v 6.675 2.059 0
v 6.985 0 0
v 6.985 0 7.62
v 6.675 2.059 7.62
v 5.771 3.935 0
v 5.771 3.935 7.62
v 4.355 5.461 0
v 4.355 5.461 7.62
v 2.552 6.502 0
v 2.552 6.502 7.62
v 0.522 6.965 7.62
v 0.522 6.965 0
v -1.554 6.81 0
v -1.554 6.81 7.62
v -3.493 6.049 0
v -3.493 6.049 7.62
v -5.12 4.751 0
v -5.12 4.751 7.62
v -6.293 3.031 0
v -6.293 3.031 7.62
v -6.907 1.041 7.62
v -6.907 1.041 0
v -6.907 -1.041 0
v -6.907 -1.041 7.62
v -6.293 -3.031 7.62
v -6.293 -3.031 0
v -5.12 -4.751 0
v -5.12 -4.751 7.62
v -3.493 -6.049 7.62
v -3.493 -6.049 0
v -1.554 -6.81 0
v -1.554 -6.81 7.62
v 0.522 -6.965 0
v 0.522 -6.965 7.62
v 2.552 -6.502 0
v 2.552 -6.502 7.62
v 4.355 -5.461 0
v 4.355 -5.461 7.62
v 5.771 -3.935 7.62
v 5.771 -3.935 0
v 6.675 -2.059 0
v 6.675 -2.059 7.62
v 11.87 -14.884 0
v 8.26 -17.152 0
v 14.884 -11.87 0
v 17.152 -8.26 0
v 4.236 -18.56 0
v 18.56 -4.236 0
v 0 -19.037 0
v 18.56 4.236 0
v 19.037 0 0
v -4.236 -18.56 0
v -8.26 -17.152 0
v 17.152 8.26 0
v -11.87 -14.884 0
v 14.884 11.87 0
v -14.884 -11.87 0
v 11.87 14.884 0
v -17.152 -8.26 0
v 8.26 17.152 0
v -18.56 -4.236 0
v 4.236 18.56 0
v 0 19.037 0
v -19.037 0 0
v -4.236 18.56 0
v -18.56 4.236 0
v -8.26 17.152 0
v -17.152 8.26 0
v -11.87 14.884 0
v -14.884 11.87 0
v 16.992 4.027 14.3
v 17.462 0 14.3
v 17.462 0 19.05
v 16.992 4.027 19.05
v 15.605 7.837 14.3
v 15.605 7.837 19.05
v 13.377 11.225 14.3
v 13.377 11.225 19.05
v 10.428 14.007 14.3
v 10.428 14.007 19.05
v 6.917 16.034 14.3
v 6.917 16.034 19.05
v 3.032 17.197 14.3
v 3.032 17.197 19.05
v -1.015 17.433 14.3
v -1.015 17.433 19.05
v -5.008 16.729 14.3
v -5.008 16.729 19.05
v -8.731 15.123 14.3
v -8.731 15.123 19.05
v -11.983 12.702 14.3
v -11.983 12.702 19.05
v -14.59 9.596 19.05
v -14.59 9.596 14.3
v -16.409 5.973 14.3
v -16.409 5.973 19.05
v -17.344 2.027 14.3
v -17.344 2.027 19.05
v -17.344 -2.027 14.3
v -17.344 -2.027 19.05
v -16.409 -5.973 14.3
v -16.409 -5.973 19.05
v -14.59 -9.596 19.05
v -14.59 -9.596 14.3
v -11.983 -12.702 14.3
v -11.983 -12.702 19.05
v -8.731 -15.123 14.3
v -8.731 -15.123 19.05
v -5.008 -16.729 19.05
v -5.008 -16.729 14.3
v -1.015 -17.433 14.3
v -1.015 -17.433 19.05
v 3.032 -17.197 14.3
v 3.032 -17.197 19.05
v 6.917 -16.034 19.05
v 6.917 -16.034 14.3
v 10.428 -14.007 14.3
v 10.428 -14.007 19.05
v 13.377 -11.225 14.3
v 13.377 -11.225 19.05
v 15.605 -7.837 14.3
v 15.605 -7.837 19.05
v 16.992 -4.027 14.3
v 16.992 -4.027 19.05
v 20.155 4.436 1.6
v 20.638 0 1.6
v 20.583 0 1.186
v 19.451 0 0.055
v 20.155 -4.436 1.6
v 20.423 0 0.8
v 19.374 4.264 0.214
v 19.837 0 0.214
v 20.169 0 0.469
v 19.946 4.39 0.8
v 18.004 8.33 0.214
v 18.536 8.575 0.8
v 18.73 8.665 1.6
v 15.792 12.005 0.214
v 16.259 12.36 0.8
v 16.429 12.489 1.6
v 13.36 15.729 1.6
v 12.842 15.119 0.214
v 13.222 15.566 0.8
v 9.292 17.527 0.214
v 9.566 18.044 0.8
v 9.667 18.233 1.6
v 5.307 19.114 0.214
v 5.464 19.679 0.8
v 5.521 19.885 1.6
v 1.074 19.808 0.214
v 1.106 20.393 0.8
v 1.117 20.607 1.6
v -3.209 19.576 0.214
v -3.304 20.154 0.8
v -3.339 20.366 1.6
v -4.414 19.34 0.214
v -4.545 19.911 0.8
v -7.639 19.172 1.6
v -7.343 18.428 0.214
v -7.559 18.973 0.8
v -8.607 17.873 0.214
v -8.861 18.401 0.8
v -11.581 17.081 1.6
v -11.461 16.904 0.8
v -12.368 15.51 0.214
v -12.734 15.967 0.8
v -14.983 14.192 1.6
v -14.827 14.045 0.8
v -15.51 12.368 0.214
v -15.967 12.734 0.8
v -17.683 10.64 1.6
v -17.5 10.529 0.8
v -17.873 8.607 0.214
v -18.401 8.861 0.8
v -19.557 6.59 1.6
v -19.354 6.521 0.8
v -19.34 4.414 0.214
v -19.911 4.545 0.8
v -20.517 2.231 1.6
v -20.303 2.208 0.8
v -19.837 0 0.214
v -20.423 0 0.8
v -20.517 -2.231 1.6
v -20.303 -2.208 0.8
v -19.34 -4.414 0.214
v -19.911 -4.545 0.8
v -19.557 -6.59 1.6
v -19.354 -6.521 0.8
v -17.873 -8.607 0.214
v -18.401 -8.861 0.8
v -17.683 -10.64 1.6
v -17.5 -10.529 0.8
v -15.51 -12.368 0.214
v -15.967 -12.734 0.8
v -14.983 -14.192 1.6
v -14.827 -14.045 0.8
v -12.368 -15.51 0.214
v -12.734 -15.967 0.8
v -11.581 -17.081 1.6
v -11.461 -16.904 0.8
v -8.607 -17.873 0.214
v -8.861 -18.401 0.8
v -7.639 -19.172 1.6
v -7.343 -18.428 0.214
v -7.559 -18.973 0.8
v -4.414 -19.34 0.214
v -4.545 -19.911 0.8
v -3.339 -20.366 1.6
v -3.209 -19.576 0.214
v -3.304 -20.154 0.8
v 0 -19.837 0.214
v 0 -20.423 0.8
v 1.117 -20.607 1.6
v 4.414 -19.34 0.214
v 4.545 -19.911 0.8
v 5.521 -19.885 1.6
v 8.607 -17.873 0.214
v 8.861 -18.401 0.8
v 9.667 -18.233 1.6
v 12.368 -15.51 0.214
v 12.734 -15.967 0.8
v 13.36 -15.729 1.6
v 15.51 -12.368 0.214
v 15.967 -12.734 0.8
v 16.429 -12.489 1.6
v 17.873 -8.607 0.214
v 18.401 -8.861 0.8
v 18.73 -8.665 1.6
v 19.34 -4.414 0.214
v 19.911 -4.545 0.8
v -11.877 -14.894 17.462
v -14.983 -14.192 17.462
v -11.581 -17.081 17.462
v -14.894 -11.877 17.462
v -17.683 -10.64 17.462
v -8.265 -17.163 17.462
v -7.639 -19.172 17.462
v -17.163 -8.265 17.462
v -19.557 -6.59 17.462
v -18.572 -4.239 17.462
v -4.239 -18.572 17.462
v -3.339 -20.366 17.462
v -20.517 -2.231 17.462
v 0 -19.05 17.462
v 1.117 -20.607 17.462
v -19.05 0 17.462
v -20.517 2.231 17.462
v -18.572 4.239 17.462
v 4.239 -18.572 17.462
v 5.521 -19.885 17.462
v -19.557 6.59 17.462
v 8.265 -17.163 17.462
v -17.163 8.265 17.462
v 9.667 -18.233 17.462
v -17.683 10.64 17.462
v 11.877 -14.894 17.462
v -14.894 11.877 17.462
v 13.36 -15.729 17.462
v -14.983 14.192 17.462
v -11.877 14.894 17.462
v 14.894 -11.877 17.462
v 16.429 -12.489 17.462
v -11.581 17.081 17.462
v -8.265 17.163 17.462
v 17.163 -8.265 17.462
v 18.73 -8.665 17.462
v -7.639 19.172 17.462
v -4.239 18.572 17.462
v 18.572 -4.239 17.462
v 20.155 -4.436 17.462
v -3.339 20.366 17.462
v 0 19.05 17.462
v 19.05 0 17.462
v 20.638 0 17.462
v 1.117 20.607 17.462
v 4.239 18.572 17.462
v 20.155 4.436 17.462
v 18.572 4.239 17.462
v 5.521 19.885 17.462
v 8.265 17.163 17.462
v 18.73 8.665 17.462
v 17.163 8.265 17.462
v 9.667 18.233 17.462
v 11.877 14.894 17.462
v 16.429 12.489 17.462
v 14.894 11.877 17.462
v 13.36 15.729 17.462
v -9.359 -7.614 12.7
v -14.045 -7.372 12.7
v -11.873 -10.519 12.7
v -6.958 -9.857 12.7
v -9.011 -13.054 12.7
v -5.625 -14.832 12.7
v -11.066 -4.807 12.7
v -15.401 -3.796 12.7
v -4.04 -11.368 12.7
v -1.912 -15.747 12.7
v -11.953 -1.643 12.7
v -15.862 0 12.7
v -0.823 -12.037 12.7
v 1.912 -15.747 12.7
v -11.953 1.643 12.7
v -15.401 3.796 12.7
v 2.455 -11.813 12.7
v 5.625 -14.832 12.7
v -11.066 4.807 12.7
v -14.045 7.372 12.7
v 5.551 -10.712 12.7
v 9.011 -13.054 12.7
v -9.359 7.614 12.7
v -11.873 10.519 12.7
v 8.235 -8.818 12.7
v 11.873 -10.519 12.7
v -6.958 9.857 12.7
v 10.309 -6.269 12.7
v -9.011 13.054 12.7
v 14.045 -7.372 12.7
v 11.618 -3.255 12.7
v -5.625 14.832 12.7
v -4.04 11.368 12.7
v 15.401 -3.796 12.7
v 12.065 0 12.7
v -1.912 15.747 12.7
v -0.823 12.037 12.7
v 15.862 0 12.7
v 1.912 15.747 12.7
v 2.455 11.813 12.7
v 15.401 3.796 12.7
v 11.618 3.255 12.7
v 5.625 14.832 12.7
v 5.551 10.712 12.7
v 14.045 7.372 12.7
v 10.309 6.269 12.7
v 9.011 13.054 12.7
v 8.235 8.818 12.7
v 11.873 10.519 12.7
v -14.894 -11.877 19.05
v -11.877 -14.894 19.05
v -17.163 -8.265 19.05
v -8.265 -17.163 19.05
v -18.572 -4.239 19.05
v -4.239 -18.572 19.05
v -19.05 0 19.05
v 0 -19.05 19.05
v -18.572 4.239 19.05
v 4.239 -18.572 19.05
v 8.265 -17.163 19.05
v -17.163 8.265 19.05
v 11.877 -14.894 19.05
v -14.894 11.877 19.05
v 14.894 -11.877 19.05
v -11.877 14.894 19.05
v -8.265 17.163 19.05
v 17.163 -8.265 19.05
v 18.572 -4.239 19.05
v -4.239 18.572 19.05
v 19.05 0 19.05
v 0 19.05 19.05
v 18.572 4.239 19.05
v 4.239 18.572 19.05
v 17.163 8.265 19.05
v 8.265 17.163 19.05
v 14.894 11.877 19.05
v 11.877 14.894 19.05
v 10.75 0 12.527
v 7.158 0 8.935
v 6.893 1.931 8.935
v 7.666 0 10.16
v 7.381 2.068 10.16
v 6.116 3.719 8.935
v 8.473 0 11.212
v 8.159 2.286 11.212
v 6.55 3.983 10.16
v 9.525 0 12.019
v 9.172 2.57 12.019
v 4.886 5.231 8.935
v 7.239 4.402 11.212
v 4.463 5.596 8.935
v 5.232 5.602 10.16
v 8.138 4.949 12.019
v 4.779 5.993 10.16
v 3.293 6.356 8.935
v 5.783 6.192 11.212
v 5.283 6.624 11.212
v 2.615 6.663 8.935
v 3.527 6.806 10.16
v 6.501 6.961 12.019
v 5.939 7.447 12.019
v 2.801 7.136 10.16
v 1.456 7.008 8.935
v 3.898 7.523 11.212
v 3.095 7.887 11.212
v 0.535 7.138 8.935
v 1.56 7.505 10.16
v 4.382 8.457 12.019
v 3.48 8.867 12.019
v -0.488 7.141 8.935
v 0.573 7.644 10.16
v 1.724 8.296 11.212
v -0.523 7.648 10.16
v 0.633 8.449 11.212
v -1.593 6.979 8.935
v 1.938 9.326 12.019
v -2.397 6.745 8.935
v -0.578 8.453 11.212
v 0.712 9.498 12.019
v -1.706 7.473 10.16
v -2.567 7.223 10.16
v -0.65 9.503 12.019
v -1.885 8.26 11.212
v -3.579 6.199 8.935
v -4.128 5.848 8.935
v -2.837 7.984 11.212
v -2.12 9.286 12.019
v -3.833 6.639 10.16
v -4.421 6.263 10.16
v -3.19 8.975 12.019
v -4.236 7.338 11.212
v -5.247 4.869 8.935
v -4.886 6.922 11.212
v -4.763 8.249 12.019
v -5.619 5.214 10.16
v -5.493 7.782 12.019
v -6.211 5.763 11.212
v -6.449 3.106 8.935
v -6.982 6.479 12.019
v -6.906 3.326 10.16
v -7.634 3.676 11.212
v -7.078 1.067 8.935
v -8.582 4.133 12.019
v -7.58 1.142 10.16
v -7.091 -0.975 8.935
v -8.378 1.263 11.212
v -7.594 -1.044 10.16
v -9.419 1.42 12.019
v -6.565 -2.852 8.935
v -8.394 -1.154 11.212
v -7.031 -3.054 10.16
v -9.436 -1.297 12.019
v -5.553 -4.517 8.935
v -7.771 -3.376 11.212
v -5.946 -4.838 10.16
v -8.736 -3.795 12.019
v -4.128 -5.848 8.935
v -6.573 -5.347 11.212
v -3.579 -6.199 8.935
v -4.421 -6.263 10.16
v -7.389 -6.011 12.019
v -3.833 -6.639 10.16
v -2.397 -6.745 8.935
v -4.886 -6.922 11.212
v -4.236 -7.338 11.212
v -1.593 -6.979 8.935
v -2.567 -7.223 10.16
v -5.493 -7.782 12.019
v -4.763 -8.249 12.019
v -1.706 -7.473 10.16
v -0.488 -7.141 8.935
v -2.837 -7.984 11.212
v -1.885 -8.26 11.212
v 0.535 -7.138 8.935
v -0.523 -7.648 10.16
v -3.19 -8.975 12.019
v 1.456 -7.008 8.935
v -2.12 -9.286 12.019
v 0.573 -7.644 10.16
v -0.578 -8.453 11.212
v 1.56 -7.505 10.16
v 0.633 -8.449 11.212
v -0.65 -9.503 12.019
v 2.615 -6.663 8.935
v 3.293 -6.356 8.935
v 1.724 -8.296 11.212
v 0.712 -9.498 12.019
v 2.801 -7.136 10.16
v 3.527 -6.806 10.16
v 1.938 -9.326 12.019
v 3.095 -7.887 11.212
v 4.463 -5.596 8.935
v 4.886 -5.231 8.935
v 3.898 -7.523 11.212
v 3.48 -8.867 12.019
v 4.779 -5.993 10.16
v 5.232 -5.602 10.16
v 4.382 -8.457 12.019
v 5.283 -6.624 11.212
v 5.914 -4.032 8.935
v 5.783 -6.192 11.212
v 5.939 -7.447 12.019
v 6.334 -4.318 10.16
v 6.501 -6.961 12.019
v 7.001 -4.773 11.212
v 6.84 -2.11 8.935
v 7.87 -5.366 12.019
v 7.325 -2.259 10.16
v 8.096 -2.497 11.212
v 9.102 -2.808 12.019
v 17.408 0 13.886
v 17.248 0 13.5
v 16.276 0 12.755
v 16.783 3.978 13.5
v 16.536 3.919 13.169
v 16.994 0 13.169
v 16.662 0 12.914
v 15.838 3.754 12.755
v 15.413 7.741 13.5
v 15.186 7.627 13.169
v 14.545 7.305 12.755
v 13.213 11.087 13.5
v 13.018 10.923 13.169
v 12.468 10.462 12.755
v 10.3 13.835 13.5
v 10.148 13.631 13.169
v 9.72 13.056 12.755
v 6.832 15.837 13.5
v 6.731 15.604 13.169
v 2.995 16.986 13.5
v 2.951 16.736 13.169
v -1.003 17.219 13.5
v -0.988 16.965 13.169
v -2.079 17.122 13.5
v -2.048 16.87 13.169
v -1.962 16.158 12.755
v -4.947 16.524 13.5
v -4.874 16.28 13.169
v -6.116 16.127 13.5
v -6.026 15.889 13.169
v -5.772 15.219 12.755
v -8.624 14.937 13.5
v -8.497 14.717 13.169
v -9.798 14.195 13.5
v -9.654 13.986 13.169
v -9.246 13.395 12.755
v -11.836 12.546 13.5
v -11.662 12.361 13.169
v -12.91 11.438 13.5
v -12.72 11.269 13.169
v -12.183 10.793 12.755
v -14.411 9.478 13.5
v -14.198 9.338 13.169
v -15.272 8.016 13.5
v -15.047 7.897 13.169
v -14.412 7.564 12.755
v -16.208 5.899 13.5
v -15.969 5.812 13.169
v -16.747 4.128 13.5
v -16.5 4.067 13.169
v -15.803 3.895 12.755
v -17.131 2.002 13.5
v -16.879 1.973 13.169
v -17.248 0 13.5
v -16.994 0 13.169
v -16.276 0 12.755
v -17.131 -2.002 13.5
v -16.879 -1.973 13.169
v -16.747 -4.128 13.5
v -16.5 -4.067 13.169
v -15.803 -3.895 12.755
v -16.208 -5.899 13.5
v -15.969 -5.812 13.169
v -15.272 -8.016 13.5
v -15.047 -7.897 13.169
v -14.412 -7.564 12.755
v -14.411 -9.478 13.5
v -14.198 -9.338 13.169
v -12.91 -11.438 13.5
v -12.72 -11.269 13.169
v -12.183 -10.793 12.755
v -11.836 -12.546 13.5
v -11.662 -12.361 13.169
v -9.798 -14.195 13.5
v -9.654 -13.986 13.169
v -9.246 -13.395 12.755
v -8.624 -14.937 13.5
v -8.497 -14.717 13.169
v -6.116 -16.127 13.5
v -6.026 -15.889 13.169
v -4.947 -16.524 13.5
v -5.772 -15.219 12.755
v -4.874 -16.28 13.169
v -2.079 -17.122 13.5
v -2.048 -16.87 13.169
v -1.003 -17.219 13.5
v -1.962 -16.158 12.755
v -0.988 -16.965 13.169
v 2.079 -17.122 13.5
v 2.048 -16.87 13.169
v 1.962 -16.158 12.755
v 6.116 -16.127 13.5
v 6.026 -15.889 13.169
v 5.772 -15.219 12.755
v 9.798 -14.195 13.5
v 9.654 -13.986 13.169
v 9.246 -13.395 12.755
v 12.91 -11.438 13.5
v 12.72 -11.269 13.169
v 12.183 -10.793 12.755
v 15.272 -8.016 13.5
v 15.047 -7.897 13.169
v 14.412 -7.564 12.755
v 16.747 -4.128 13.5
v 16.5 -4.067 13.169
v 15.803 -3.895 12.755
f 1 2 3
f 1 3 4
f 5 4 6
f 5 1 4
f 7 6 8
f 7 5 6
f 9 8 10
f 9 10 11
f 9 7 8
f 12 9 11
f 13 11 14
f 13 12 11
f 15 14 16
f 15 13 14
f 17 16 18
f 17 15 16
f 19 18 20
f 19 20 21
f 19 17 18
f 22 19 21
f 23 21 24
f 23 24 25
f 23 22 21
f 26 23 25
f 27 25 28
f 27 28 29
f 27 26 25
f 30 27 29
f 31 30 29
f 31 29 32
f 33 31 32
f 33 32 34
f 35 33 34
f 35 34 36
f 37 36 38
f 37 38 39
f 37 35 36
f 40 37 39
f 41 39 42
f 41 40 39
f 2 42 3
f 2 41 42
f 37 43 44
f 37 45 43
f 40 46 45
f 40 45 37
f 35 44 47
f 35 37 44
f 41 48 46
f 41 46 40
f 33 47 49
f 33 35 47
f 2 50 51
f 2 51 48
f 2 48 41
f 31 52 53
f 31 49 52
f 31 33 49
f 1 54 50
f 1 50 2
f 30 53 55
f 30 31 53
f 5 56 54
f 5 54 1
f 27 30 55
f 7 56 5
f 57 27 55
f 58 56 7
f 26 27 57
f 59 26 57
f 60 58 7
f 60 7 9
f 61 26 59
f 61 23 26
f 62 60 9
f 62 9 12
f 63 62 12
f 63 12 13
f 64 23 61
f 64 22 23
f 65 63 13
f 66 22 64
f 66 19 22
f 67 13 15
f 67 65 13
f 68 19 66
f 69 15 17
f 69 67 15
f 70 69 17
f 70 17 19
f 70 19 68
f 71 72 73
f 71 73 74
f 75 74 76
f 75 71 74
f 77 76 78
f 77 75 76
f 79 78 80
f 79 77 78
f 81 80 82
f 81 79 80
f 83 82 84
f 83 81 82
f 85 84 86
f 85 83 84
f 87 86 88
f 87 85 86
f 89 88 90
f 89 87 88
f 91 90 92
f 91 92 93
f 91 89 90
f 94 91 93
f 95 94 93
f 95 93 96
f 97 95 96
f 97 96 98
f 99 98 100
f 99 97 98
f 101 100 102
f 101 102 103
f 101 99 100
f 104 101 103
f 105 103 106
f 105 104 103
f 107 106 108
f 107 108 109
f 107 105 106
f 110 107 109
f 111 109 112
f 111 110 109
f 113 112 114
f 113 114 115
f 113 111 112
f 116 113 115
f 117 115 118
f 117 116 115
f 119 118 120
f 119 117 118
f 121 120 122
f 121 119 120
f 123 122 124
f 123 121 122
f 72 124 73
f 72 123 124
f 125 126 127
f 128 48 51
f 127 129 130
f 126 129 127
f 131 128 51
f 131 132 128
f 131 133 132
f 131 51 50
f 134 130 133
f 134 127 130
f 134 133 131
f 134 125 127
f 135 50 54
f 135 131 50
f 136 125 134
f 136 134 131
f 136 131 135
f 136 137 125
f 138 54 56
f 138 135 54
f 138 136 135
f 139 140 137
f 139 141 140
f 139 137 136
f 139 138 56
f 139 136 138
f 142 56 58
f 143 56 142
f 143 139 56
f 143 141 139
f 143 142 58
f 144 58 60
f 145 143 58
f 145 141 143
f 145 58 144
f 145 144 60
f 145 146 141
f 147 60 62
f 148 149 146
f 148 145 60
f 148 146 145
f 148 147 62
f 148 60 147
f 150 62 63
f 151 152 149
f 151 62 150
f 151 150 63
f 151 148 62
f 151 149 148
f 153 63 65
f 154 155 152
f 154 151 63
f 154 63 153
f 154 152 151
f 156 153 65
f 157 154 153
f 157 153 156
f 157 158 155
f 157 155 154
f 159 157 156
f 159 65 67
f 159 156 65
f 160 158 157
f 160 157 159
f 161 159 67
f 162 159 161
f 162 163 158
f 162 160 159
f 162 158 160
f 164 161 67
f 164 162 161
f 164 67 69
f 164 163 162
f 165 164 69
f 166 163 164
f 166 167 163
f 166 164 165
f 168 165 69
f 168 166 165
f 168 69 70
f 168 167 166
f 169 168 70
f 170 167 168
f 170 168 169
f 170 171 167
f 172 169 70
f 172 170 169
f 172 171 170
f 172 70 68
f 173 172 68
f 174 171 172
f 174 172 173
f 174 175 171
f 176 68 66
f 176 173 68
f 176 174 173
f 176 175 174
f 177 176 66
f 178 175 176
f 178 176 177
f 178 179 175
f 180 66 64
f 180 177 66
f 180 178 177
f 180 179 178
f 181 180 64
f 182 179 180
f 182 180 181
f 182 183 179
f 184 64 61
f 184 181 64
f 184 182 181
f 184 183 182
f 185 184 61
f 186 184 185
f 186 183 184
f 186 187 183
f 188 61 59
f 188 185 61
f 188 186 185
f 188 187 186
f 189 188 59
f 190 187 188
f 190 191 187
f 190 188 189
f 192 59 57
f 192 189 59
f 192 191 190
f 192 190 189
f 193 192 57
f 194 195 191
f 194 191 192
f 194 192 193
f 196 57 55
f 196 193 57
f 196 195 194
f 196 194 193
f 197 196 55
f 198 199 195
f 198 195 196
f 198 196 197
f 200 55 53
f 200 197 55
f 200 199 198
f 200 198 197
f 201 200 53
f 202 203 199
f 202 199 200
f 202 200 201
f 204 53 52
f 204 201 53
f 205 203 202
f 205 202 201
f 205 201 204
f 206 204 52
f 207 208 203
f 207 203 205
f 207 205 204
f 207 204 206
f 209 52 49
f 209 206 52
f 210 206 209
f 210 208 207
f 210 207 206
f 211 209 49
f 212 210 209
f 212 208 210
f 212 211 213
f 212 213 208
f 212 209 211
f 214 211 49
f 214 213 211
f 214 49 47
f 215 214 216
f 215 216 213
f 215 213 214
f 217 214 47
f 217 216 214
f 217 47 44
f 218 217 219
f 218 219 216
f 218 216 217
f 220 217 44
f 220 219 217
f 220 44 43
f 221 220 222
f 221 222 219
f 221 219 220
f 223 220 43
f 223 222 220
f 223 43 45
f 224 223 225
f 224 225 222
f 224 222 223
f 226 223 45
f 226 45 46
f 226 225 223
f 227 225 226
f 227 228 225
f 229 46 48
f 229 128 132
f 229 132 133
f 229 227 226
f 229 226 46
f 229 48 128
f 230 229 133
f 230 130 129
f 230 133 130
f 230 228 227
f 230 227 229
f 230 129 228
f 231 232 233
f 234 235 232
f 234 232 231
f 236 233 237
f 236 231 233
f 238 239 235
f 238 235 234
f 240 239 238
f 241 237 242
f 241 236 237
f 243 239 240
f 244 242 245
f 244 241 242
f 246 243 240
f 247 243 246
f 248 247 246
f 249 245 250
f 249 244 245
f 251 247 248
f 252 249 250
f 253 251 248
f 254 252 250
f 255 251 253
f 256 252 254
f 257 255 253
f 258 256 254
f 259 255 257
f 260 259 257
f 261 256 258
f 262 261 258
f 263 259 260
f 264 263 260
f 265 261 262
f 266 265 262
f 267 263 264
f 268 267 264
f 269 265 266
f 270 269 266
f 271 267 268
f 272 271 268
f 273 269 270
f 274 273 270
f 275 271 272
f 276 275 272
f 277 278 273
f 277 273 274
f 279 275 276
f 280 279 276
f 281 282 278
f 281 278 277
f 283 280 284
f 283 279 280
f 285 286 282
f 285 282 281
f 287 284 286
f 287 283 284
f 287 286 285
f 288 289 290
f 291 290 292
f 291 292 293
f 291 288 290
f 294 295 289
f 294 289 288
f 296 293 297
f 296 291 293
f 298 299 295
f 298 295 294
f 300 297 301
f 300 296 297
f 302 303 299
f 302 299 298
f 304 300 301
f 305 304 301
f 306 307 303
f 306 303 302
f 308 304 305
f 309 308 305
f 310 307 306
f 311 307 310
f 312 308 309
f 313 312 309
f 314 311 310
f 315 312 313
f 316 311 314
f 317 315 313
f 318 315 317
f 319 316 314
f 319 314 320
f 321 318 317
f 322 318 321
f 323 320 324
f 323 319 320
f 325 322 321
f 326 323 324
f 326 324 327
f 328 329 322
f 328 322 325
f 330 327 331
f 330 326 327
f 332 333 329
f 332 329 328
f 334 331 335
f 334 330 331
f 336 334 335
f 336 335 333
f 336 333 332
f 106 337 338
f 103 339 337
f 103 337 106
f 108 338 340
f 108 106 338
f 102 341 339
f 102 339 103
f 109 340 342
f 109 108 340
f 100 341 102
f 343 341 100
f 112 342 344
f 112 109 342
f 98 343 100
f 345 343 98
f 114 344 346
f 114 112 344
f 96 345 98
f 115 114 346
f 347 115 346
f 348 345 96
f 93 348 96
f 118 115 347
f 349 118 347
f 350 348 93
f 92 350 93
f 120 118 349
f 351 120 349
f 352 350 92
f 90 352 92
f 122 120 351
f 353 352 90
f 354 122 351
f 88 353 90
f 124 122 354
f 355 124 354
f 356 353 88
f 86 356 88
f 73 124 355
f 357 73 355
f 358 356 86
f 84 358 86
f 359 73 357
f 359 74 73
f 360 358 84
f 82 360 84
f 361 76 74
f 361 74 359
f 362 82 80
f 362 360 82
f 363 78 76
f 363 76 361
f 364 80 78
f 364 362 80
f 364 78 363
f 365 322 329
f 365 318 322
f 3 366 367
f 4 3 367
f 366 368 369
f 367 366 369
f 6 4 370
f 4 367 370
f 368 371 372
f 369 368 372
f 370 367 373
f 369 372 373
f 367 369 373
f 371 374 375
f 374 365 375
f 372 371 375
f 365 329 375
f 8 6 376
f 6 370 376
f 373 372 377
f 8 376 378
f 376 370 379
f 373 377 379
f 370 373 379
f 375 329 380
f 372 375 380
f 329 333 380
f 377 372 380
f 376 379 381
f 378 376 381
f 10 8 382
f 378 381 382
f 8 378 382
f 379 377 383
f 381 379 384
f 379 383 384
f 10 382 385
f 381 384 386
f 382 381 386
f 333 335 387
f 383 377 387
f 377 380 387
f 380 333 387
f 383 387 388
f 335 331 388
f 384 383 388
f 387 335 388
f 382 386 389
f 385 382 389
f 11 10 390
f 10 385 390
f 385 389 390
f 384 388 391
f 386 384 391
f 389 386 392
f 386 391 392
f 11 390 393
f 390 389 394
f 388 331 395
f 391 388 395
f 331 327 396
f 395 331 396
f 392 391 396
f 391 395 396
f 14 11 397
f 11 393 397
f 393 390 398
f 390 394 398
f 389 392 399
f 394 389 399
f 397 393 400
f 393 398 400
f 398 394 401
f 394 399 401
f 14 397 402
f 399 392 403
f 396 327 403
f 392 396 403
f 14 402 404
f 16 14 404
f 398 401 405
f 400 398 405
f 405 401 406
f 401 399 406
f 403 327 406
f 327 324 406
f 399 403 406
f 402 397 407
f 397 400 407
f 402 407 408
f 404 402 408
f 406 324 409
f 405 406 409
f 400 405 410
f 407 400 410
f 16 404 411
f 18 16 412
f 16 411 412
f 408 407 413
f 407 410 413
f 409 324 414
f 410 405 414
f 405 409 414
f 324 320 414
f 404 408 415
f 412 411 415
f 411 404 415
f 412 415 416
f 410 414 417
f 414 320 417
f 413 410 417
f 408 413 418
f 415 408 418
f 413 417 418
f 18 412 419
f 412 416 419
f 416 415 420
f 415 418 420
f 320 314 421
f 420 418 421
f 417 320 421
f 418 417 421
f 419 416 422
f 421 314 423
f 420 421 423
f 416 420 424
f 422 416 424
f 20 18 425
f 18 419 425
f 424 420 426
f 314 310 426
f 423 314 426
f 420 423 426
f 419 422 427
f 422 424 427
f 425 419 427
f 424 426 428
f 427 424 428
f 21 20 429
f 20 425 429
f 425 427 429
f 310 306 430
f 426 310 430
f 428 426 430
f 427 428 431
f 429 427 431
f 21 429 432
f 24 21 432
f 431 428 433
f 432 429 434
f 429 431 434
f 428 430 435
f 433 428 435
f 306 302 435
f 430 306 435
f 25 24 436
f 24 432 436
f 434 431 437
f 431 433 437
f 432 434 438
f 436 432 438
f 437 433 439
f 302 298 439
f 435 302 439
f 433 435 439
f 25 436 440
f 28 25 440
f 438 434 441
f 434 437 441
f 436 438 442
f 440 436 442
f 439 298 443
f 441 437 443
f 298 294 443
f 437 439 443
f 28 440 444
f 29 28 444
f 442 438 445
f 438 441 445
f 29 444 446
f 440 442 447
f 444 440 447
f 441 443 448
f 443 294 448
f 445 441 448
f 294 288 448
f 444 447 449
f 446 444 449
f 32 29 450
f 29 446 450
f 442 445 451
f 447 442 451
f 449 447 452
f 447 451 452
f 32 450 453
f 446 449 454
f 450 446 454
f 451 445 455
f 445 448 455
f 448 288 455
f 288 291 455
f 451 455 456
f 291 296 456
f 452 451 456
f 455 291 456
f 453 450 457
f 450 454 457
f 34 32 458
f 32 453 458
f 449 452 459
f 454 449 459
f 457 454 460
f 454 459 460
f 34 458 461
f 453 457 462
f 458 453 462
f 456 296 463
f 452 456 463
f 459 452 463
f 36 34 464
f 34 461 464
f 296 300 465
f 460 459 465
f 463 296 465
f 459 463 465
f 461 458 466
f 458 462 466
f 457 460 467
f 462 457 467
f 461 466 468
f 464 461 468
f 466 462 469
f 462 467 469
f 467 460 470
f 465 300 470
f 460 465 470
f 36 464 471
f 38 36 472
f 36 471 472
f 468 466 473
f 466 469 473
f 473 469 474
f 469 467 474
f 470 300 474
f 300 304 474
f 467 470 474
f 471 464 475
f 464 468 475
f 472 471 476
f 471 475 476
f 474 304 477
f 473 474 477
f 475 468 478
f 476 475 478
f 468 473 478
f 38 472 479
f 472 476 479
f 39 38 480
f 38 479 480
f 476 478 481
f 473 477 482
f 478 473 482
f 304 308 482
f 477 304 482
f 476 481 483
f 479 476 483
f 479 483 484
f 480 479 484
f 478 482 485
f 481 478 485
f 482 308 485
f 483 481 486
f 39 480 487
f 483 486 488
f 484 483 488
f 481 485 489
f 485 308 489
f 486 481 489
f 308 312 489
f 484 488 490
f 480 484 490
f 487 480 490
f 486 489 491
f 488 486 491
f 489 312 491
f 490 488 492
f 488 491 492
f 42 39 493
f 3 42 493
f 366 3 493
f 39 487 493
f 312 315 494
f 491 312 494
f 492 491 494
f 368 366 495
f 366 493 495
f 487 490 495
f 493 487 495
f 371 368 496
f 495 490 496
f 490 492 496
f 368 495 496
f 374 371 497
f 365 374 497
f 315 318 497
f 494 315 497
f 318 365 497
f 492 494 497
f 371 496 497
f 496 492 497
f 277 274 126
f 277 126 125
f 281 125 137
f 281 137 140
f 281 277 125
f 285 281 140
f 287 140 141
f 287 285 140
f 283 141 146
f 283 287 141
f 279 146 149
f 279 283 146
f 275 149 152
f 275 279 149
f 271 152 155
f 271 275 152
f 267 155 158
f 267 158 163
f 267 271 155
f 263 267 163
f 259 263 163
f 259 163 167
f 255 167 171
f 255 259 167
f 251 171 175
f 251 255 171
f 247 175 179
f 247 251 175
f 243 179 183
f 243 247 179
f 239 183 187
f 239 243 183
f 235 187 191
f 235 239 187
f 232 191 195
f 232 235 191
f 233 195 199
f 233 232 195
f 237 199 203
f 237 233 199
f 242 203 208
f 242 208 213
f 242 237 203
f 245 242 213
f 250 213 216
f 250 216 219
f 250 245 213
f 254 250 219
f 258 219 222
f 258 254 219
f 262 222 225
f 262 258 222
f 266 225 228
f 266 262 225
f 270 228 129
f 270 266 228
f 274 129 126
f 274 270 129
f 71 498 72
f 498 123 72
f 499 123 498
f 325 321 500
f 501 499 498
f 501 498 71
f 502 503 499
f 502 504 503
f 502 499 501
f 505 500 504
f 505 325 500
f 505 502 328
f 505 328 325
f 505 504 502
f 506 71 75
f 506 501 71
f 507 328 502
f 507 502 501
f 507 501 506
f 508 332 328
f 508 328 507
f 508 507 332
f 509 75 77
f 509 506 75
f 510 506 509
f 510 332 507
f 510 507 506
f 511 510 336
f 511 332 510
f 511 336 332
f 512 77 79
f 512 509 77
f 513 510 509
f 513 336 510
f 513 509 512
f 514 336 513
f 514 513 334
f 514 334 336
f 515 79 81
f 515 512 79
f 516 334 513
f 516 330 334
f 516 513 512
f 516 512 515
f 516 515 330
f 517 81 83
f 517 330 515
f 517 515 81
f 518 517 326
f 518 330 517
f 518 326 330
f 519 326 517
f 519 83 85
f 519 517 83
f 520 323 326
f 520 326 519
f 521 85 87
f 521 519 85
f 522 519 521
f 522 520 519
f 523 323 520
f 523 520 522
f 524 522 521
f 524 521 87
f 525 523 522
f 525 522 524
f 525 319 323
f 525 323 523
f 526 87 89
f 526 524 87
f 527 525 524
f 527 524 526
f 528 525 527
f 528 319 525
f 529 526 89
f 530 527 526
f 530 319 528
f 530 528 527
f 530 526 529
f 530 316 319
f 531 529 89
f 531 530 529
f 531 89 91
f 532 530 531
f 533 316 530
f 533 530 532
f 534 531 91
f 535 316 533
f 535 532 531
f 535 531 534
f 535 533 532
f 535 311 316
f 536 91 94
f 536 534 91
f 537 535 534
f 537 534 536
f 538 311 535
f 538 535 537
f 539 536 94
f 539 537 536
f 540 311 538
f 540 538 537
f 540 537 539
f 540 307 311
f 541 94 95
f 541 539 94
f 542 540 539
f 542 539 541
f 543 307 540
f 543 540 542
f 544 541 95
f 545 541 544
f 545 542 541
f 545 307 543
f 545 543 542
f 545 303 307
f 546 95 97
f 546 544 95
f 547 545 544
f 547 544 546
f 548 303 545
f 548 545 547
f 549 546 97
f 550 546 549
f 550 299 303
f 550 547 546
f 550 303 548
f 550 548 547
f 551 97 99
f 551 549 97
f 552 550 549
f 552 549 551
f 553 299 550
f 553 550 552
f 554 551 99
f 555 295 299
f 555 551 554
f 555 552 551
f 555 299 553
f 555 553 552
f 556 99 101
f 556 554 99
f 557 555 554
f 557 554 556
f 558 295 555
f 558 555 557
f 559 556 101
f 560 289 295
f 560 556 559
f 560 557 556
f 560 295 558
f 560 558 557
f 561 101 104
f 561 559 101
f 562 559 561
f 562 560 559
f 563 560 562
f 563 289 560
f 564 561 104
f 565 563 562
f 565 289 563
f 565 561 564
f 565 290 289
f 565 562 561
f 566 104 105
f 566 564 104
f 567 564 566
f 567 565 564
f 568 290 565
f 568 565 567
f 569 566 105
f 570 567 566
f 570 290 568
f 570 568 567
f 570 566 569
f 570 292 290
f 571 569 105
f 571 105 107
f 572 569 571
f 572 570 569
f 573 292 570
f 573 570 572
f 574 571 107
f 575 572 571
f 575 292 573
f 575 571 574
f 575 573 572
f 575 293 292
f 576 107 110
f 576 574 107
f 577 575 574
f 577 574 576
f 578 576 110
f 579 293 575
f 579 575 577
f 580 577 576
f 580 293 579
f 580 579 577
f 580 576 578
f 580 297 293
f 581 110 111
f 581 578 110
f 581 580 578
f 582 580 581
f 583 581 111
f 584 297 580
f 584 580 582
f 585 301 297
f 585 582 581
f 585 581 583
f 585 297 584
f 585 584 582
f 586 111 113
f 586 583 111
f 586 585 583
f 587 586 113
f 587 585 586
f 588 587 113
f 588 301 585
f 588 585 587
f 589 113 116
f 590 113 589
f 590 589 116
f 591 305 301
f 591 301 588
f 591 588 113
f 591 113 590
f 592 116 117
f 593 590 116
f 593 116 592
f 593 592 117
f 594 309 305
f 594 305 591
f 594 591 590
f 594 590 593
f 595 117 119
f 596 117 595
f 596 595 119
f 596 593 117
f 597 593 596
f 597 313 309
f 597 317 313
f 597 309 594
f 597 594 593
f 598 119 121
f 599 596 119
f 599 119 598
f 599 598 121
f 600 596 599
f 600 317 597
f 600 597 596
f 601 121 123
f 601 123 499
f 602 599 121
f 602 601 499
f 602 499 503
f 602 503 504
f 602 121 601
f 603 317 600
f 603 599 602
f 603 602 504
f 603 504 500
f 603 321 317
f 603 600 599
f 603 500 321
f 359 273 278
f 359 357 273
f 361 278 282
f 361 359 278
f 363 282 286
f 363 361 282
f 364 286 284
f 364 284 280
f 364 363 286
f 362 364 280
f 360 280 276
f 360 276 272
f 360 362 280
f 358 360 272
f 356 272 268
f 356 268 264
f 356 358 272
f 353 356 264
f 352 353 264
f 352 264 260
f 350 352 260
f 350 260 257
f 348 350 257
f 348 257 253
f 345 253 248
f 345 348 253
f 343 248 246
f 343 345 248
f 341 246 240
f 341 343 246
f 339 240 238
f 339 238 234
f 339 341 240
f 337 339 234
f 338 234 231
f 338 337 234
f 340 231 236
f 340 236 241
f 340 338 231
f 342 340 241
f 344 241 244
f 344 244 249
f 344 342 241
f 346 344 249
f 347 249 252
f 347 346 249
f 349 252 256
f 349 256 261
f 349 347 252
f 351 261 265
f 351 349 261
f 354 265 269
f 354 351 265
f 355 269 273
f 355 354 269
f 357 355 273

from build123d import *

# Parameters (mm, degrees)
F2_R = 1.6002
F3_R = 5.08


with BuildPart() as f1:
    # F0 (on Front) → F1 (revolve)
    with BuildSketch(Plane.XZ):
        Polygon((6.985, 12.7), (6.985, 0), (20.6375, 0), (20.6375, 17.4625), (19.05, 17.4625), (19.05, 19.05), (17.4625, 19.05), (17.4625, 12.7), align=None)
    revolve(axis=Axis((0, 0, 17.878274), (0, 0, 1)))

    # F2
    f2_edges = [f1.edges().sort_by_distance(p)[0] for p in [
        (-17.4625, 0, 12.7),
        (-20.6375, 0, 0),
    ]]
    fillet(f2_edges, radius=F2_R)

    # F3
    f3_edges = [f1.edges().sort_by_distance(p)[0] for p in [
        (-6.985, 0, 12.7),
    ]]
    fillet(f3_edges, radius=F3_R)


solid = f1.part
